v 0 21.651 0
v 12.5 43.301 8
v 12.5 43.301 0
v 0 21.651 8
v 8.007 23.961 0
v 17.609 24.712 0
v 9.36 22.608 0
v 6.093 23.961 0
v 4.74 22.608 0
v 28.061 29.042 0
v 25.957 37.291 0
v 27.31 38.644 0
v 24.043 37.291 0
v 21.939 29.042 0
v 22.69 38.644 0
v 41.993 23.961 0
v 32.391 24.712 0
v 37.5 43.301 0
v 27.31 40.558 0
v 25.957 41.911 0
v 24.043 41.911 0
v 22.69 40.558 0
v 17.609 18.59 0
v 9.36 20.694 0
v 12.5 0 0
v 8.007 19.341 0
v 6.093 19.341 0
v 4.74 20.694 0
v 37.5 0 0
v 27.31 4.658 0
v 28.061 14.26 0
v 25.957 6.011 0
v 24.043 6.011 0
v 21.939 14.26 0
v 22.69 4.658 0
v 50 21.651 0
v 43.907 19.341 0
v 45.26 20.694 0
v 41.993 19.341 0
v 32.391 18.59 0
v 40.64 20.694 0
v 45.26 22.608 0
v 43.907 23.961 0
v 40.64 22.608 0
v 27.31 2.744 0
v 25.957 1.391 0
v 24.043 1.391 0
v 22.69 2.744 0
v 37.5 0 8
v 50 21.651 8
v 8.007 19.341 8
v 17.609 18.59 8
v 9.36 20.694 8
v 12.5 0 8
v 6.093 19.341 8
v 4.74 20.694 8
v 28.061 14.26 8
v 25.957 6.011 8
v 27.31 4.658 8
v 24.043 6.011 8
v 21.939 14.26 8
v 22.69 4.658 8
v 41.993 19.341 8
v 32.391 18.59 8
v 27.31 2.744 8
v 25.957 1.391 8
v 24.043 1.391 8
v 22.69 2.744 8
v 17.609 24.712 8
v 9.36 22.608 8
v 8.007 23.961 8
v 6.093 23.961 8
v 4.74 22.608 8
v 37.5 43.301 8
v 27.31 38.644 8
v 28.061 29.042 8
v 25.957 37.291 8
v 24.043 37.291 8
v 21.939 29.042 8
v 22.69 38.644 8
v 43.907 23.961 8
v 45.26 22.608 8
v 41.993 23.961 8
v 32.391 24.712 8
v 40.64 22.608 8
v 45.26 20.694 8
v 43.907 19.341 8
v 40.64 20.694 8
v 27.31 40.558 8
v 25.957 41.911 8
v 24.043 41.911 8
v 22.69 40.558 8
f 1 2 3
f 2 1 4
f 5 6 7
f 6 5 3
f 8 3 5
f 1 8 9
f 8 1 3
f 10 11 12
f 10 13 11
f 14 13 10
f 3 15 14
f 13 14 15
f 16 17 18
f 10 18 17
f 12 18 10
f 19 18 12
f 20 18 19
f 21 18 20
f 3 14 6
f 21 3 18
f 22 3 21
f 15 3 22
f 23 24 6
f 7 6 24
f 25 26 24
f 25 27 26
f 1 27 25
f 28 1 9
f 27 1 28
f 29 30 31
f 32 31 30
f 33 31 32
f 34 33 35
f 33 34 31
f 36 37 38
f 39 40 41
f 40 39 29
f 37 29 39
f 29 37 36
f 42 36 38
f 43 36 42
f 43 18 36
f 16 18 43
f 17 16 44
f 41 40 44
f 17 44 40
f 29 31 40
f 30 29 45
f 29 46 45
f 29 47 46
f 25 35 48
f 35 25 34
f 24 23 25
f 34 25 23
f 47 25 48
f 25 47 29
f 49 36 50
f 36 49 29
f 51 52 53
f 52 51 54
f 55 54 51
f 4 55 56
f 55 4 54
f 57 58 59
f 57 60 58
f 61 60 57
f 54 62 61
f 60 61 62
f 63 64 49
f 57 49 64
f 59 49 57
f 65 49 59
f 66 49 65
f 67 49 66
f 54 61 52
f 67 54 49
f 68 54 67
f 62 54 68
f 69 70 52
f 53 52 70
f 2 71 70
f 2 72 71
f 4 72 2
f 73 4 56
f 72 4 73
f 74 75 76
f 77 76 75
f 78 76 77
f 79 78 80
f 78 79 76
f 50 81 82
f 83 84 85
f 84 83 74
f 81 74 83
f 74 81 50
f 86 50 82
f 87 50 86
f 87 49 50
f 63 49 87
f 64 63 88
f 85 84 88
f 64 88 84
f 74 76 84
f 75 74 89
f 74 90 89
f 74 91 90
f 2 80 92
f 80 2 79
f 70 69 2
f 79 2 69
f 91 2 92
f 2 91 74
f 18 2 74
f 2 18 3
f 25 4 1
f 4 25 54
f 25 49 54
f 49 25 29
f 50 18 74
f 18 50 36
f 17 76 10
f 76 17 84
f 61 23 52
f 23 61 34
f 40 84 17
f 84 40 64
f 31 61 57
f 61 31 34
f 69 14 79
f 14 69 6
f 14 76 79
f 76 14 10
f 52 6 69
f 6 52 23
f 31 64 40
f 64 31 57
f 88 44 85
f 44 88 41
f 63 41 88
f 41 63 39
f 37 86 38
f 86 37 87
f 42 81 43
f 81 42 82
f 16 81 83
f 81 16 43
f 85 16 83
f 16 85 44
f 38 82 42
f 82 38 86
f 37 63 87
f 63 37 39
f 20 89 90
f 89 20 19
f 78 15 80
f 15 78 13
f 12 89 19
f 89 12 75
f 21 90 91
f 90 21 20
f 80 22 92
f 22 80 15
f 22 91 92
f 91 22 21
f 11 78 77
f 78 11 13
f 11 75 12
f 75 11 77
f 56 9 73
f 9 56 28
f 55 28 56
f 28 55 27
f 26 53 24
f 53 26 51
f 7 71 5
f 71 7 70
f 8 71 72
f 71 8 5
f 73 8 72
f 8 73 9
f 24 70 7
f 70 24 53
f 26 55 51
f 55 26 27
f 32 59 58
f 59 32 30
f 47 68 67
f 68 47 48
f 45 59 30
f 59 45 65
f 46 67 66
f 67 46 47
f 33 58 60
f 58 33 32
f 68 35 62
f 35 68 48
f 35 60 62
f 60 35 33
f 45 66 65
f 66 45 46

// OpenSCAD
$fn = 32;

// ----------------------------------------------------------------------
// Polygon plate: 6-gon R25, 4 bolt windows
// ----------------------------------------------------------------------

// --- parameters (mm) ---
sides = 6;                // number of polygon sides
plate_r = 25;             // circumscribed radius of the polygon
bore_r = 8;               // centre bore radius
bolts = 4;                // number of bolt windows
ring_r = 17.95;           // bolt-circle radius
bolt_r = 2.5;             // bolt window radius
plate_t = 8;              // plate thickness, Z (extrusion height)

plate_d = 2 * plate_r;  // circumscribed diameter
bore_d = 2 * bore_r;  // centre bore diameter
bolt_d = 2 * bolt_r;  // bolt window diameter
ring_d = 2 * ring_r;  // bolt-circle diameter

profile = [[50, 21.651], [37.5, 43.301], [12.5, 43.301], [0, 21.651], [12.5, 0], [37.5, 0]];  // primary outline, 6 points, counter clockwise
void_1 = [[32.391, 24.712], [28.061, 29.042], [21.939, 29.042], [17.609, 24.712], [17.609, 18.59], [21.939, 14.26], [28.061, 14.26], [32.391, 18.59]];  // centre bore, 8 points
void_2 = [[45.26, 22.608], [43.907, 23.961], [41.993, 23.961], [40.64, 22.608], [40.64, 20.694], [41.993, 19.341], [43.907, 19.341], [45.26, 20.694]];  // bolt window 1, 8 points
void_3 = [[27.31, 40.558], [25.957, 41.911], [24.043, 41.911], [22.69, 40.558], [22.69, 38.644], [24.043, 37.291], [25.957, 37.291], [27.31, 38.644]];  // bolt window 2, 8 points
void_4 = [[9.36, 22.608], [8.007, 23.961], [6.093, 23.961], [4.74, 22.608], [4.74, 20.694], [6.093, 19.341], [8.007, 19.341], [9.36, 20.694]];  // bolt window 3, 8 points
void_5 = [[27.31, 4.658], [25.957, 6.011], [24.043, 6.011], [22.69, 4.658], [22.69, 2.744], [24.043, 1.391], [25.957, 1.391], [27.31, 2.744]];  // bolt window 4, 8 points

// --- the one profile operation ---
difference() {
  linear_extrude(height = plate_t) polygon(points = profile);
  translate([0, 0, -1])
    linear_extrude(height = plate_t + 2) polygon(points = void_1);
  translate([0, 0, -1])
    linear_extrude(height = plate_t + 2) polygon(points = void_2);
  translate([0, 0, -1])
    linear_extrude(height = plate_t + 2) polygon(points = void_3);
  translate([0, 0, -1])
    linear_extrude(height = plate_t + 2) polygon(points = void_4);
  translate([0, 0, -1])
    linear_extrude(height = plate_t + 2) polygon(points = void_5);
}
